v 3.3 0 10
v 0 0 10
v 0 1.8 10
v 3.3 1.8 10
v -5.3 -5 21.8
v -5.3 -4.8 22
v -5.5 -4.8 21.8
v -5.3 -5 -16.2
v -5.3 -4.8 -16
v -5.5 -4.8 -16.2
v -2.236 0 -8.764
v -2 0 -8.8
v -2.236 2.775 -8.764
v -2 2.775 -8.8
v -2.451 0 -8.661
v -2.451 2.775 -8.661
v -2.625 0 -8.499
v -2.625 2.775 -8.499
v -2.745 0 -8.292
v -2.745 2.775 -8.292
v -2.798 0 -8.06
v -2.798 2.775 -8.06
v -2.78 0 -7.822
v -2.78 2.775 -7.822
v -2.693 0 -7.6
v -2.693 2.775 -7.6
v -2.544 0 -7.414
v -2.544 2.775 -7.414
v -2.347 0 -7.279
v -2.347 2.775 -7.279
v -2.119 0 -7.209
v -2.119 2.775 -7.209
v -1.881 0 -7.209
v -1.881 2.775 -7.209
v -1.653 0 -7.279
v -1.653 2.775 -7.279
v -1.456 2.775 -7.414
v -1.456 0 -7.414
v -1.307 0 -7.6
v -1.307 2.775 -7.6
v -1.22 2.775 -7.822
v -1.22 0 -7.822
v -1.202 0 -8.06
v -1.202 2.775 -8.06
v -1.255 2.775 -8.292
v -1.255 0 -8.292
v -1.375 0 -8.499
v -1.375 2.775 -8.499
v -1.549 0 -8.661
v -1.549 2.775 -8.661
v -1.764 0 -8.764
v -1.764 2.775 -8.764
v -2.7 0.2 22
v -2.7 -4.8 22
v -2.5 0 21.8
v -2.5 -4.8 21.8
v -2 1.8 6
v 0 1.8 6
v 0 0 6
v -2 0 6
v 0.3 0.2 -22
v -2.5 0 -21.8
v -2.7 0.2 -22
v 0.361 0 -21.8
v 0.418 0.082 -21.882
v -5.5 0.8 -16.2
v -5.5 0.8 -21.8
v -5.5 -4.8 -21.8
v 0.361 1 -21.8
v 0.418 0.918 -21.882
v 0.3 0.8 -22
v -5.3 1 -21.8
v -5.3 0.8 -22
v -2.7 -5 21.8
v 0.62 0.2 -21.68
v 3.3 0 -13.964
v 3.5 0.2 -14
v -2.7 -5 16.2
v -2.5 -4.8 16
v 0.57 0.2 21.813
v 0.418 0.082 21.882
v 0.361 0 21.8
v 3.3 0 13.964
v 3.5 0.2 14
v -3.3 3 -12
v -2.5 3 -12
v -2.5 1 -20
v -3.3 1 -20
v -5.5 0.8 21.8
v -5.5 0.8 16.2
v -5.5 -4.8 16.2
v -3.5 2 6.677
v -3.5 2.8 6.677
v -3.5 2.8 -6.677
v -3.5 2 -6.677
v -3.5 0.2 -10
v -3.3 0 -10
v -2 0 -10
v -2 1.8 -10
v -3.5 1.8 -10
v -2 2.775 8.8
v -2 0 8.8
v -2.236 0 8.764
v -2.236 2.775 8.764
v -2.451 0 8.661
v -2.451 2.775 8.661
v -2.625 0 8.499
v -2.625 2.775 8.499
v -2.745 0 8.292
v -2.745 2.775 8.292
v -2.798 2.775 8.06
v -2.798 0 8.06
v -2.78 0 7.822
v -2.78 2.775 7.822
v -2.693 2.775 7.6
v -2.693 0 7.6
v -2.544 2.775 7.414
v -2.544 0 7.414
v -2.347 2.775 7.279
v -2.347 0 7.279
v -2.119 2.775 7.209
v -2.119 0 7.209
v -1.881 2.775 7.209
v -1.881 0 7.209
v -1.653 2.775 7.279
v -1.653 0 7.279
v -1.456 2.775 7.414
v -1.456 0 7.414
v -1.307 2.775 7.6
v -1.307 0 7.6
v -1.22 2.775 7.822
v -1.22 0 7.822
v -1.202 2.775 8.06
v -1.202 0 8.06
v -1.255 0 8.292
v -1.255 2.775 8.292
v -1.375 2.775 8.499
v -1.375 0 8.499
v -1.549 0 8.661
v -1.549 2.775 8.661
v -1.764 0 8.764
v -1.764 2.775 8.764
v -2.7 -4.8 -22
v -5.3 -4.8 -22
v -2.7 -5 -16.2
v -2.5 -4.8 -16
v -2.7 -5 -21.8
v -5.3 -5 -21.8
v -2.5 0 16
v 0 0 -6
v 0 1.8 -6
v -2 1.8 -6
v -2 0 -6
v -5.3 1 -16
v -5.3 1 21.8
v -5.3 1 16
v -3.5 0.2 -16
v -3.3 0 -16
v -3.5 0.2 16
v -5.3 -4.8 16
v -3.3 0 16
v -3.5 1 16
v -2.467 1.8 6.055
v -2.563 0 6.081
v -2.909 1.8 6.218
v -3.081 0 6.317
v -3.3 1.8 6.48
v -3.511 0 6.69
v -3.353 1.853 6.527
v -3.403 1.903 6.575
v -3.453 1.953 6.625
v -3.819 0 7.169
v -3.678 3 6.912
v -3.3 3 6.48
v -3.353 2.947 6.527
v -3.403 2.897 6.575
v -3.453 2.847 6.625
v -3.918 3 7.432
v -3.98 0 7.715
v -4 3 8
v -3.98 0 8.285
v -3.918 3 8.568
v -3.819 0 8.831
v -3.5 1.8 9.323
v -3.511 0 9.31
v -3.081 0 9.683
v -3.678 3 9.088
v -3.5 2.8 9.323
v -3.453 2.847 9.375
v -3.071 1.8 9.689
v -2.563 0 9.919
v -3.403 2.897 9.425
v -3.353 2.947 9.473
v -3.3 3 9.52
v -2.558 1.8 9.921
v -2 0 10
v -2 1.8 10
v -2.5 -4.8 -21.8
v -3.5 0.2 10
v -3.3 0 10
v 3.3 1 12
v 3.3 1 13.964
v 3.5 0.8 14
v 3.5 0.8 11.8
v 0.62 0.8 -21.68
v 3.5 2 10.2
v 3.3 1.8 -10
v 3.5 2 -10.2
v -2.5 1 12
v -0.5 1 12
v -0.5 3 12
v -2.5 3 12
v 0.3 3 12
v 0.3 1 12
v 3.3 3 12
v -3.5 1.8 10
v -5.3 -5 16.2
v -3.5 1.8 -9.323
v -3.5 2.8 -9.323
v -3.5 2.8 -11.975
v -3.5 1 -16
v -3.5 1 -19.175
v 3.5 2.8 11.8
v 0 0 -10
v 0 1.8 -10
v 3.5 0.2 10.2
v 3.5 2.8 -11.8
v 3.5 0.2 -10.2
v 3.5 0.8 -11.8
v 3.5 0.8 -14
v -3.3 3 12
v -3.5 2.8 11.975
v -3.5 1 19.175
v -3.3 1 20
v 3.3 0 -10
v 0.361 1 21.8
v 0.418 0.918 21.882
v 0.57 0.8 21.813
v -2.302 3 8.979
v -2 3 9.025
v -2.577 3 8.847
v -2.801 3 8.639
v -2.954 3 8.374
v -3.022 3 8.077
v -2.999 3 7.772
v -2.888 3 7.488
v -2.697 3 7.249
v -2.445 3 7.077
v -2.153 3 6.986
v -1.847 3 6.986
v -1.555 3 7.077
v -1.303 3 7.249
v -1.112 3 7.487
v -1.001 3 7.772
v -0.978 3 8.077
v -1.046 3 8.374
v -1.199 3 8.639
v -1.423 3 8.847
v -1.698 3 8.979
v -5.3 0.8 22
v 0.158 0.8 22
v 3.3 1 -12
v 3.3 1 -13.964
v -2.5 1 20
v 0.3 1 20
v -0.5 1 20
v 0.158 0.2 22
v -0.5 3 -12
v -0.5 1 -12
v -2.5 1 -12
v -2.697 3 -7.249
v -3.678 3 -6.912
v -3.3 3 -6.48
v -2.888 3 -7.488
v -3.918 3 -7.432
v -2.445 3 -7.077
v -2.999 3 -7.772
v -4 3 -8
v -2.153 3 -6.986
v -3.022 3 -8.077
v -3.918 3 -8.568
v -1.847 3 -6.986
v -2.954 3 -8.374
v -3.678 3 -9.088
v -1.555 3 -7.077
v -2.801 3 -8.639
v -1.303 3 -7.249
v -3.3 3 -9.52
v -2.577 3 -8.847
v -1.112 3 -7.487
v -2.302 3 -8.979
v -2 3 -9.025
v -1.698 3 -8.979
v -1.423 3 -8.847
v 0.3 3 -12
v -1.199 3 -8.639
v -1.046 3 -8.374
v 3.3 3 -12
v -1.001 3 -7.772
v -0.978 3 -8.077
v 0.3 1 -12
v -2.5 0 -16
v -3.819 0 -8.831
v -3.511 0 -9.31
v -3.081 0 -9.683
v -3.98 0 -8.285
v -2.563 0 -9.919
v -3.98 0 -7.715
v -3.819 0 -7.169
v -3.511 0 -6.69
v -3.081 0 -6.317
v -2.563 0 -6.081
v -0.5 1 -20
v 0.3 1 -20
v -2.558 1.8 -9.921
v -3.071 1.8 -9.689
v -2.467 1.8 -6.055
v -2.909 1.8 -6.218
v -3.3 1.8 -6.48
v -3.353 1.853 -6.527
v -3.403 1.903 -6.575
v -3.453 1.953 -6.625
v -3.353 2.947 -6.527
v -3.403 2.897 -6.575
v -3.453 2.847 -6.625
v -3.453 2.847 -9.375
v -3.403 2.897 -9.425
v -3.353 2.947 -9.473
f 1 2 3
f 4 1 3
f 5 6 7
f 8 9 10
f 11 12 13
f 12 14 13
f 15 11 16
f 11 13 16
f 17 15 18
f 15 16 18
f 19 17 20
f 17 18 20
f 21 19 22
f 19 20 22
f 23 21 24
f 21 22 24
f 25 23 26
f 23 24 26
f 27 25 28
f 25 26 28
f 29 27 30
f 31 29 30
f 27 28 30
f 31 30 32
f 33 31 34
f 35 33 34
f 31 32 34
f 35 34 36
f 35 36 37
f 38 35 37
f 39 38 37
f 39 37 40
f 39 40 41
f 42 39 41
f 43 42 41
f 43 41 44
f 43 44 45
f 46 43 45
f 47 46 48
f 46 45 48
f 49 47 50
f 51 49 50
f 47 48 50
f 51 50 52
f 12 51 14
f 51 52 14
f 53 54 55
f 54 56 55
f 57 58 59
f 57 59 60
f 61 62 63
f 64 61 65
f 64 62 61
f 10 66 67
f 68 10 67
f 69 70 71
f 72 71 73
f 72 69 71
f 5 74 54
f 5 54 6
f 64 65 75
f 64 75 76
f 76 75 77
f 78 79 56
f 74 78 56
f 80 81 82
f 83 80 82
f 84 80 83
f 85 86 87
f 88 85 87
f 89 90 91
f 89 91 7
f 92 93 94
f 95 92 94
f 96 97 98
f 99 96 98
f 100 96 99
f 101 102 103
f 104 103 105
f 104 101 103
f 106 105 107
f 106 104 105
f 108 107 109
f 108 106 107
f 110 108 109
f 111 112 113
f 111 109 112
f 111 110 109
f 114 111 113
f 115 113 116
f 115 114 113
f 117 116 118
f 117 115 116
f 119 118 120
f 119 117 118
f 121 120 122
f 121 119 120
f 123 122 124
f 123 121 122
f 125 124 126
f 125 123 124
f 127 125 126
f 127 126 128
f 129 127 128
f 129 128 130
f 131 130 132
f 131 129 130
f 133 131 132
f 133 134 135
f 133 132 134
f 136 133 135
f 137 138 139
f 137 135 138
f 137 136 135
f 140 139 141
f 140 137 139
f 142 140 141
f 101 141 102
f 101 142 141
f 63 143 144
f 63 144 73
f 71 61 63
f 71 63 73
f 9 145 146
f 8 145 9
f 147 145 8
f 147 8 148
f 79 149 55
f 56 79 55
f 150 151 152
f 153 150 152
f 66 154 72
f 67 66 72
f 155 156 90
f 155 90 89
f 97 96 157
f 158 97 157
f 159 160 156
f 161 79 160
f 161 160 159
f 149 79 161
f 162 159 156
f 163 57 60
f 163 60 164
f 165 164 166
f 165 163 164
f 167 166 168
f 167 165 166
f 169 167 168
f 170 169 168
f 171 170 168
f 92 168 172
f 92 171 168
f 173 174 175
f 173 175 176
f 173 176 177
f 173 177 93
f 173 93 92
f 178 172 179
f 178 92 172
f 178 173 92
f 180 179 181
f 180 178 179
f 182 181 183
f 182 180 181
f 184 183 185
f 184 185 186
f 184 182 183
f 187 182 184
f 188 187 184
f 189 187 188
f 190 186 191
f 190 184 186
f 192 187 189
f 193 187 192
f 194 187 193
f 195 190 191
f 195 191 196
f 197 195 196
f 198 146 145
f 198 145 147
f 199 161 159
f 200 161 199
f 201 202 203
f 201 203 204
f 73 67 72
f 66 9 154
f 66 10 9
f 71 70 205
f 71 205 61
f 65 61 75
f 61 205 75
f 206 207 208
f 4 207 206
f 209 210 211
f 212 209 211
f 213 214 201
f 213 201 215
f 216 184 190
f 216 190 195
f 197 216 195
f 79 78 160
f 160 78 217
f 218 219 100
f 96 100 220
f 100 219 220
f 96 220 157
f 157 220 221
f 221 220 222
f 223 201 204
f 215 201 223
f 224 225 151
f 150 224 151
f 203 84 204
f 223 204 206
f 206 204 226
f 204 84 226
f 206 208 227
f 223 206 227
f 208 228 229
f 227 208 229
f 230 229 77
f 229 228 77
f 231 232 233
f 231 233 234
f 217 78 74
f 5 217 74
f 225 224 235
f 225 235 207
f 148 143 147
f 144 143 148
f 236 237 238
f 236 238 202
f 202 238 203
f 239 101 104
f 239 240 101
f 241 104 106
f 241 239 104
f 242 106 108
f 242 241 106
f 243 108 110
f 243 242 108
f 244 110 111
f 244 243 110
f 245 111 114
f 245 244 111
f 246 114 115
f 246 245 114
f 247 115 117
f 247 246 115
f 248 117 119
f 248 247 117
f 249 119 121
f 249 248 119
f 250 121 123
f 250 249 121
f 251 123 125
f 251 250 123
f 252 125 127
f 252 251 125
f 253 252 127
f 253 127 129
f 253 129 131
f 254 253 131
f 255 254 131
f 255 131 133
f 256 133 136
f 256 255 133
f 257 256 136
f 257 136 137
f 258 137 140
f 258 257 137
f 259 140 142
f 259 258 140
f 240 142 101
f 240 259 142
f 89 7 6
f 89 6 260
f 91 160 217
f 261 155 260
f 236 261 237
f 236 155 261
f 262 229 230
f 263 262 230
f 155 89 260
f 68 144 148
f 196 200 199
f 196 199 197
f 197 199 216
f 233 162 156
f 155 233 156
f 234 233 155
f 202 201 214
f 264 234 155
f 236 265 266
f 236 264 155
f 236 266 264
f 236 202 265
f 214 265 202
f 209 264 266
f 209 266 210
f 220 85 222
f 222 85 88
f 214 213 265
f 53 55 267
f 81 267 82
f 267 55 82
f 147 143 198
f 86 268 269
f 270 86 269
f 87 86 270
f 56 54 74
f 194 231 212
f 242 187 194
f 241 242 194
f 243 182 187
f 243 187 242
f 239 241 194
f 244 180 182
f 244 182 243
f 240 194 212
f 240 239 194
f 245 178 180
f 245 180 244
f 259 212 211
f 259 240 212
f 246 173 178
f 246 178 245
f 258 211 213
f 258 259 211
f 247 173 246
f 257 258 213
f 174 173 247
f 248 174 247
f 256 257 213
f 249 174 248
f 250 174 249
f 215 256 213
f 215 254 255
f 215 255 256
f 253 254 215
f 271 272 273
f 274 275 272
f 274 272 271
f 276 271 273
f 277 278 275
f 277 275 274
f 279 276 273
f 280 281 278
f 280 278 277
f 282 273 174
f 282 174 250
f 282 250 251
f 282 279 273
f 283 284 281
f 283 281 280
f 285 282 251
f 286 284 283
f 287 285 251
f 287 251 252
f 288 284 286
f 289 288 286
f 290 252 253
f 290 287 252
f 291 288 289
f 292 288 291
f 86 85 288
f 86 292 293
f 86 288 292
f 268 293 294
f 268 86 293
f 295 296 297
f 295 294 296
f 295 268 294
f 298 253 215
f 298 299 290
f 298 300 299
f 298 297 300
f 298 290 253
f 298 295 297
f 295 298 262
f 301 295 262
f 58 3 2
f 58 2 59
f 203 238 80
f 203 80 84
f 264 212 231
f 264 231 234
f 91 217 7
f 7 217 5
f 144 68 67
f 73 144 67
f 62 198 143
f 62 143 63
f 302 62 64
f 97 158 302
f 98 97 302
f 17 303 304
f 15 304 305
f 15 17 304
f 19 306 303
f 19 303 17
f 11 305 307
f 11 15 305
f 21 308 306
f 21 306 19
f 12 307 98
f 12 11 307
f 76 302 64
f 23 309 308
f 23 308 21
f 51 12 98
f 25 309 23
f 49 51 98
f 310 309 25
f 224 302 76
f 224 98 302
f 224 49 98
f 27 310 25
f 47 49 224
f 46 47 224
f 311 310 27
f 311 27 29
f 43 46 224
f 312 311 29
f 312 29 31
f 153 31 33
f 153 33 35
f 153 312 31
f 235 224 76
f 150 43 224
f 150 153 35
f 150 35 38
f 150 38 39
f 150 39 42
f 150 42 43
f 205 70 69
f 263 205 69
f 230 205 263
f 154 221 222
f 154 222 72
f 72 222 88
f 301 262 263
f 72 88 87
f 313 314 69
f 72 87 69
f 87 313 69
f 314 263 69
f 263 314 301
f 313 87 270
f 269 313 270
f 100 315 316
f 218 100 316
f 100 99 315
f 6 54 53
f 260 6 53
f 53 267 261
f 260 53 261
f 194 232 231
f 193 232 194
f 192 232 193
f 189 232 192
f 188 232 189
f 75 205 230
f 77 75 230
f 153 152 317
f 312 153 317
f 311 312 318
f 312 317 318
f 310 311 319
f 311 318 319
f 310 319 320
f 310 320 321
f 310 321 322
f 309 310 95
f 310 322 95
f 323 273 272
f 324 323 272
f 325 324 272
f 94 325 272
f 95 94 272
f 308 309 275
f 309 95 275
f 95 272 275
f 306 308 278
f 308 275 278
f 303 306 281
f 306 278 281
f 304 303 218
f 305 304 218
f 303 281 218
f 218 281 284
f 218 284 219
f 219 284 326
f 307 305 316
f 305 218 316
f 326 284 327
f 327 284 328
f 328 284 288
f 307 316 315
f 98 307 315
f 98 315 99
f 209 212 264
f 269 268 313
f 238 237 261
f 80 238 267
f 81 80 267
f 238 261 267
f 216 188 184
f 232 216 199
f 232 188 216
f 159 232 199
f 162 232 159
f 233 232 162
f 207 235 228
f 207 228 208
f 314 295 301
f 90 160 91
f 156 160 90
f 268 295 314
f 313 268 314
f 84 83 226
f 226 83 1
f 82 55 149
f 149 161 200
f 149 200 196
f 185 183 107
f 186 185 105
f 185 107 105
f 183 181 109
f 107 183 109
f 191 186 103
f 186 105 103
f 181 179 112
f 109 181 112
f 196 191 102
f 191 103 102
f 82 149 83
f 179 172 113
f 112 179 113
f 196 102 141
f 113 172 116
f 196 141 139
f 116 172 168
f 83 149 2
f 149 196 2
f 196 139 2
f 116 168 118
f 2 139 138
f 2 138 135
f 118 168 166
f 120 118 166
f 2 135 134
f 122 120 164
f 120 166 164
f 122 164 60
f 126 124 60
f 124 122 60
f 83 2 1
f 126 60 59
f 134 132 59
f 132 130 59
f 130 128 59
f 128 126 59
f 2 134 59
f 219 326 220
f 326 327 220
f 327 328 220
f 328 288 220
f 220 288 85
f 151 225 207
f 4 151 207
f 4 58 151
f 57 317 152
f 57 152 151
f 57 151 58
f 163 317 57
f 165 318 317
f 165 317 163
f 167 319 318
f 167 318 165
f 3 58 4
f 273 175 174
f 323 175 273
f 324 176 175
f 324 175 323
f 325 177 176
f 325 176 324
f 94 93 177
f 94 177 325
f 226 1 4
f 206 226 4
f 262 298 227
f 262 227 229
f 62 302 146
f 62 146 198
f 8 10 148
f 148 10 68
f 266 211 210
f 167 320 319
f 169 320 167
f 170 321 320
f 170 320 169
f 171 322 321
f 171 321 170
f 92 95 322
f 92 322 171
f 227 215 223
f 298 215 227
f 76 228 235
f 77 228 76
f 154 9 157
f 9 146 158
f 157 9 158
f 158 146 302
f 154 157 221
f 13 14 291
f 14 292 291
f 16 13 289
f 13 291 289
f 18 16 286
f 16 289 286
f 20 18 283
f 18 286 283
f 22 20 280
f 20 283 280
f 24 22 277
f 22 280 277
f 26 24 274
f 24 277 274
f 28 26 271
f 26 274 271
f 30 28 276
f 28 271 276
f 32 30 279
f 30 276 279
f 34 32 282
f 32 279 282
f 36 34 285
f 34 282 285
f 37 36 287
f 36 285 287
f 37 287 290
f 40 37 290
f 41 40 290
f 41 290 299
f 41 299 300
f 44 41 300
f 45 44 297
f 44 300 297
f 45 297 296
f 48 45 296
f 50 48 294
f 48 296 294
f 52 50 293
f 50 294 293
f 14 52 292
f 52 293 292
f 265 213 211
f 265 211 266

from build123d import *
from OCP.BRepFilletAPI import BRepFilletAPI_MakeChamfer

# Parameters (mm, degrees)
SKETCH_1_W          = 7
SKETCH_1_H          = 44
EXTRUDE_1_DEPTH     = 3
CUT_EXTRUDE_1_DEPTH = 23.477766793
CUT_EXTRUDE_2_DEPTH = 24.280893454
RIB_4_REACH         = 25.281
SKETCH_4_WALL_W     = 56.807998158
SKETCH_4_WALL_H     = 1
RIB_5_REACH         = 24.561
SKETCH_5_WALL_W     = 55.368267942
SKETCH_5_WALL_H     = 0.8
SKETCH_10_W         = 20
SKETCH_10_H         = 3.6
CUT_EXTRUDE_3_DEPTH = 24.280893454
EXTRUDE_2_DEPTH     = 3
EXTRUDE_START       = -1
SKETCH_9_W          = 6
SKETCH_9_H          = 6
EXTRUDE_3_DEPTH     = 3
CHAMFER_1_SIZE      = 0.2
CHAMFER_1_SIZE2     = 0.34176015
CHAMFER_2_SIZE      = 0.2
CHAMFER_3_SIZE      = 0.2


with BuildPart() as part:
    # 草图1 → 凸台-拉伸1 (new body)
    with BuildSketch(Plane(origin=(0, 0, 0), x_dir=(1, 0, 0), z_dir=(0, 1, 0))):
        Rectangle(SKETCH_1_W, SKETCH_1_H)
    extrude(amount=EXTRUDE_1_DEPTH)

    # 草图2 → 切除-拉伸1 (cut, through all)
    with BuildSketch(Plane(origin=(0, 3, 0), x_dir=(1, 0, 0), z_dir=(0, 1, 0))):
        Polygon((3.5, 22), (0.5, 22), (3.5, 14), align=None)
        Polygon((3.5, -22), (0.5, -22), (3.5, -14), align=None)
    extrude(amount=-CUT_EXTRUDE_1_DEPTH, mode=Mode.SUBTRACT)

    # 草图3 → 切除-拉伸2 (cut, through all)
    with BuildSketch(Plane(origin=(3.5, 0, 0), x_dir=(0, 0, -1), z_dir=(1, 0, 0))):
        Polygon((-14, 2.6), (-14, 3), (-22, 3), (-22, 1), align=None)
        Polygon((-14, 1), (-14, 2.6), (-22, 1), align=None)
        Polygon((-12, 1), (-12, 3), (-14, 2.6), (-14, 1), align=None)
        Polygon((-14, 2.6), (-12, 3), (-14, 3), align=None)
        Polygon((14, 2.6), (12, 3), (12, 1), (14, 1), align=None)
        Polygon((22, 1), (14, 2.6), (14, 1), align=None)
        Polygon((22, 3), (14, 3), (14, 2.6), (22, 1), align=None)
        Polygon((14, 3), (12, 3), (14, 2.6), align=None)
    extrude(amount=-CUT_EXTRUDE_2_DEPTH, mode=Mode.SUBTRACT)

    # 草图4 wall → 筋4 (add, up to next)
    with BuildSketch(Plane(origin=(-3.5, 2, 16), x_dir=(0, -0.242535625036, 0.970142500145), z_dir=(0, 0.970142500145, 0.242535625036)), mode=Mode.PRIVATE) as rib_4_sk1:
        with Locations((0, 0.5)):
            Rectangle(SKETCH_4_WALL_W, SKETCH_4_WALL_H)
    rib_4_tool1 = extrude(rib_4_sk1.sketch, amount=-RIB_4_REACH, mode=Mode.PRIVATE) - part.part
    rib_4 = rib_4_tool1.solids().sort_by_distance((-3.5, 2, 16))[0]
    add(rib_4)

    # 草图5 wall → 筋5 (add, up to next)
    with BuildSketch(Plane(origin=(-0.5, 2, 16), x_dir=(0, -0.242535625036, 0.970142500145), z_dir=(0, 0.970142500145, 0.242535625036)), mode=Mode.PRIVATE) as rib_5_sk1:
        with Locations((0, 0.4)):
            Rectangle(SKETCH_5_WALL_W, SKETCH_5_WALL_H)
    rib_5_tool1 = extrude(rib_5_sk1.sketch, amount=-RIB_5_REACH, mode=Mode.PRIVATE) - part.part
    rib_5 = rib_5_tool1.solids().sort_by_distance((-0.5, 2, 16))[0]
    add(rib_5)

    # 草图10 → 切除-拉伸3 (cut, through all)
    with BuildSketch(Plane.ZY.offset(3.5)):
        Rectangle(SKETCH_10_W, SKETCH_10_H)
    extrude(amount=-CUT_EXTRUDE_3_DEPTH, mode=Mode.SUBTRACT)

    # 草图6 → 凸台-拉伸2 (add)
    with BuildSketch(Plane(origin=(0, 3, 0), x_dir=(1, 0, 0), z_dir=(0, 1, 0))):
        with BuildLine():
            Line((0, -6), (-2, -6))
            ThreePointArc((-2, -6), (-4, -8), (-2, -10))
            Line((-2, -10), (0, -10))
            Line((0, -10), (0, -6))
        make_face()
    extrude_2 = extrude(amount=-EXTRUDE_2_DEPTH)

    # 草图8 → M2 螺纹孔1 (revolve, cut)
    with BuildSketch(Plane(origin=(-2, 3, 8), x_dir=(0, 0, 1), z_dir=(1, 0, 0))):
        Polygon((0, 0), (0, 6.480688495), (0.8, 6), (0.8, 0.225), (1.025, 0), align=None)
    hole_wizard_m2_1 = revolve(axis=Axis((-2, 9.35, 8), (0, -1, 0)), mode=Mode.SUBTRACT)

    # 草图9 → 凸台-拉伸3 (add)
    with BuildSketch(Plane.ZY.offset(3.5).offset(EXTRUDE_START)):
        with Locations((19, -2)):
            Rectangle(SKETCH_9_W, SKETCH_9_H)
    extrude_3 = extrude(amount=EXTRUDE_3_DEPTH)

    # 镜向1: 筋4, 筋5, 凸台-拉伸2, M2 螺纹孔1, 凸台-拉伸3 across plane
    add(rib_4.mirror(Plane.XY))
    add(rib_5.mirror(Plane.XY))
    add(extrude_2.mirror(Plane.XY))
    add(hole_wizard_m2_1.mirror(Plane.XY), mode=Mode.SUBTRACT)
    add(extrude_3.mirror(Plane.XY))

    # 倒角1: one chamfer whose edges measure the first distance from different faces: ONE call of the kernel's chamfer builder (chamfer() names one face for all edges)
    chamfer_1_edges_1 = [part.edges().sort_by_distance(p)[0] for p in [
        (0.5, 0.5, -22),
    ]]
    chamfer_1_side_1 = [part.faces().sort_by_distance(p)[0] for p in [
        (-3.571428571, -1.642857143, -22),
    ]]
    chamfer_1_edges_2 = [part.edges().sort_by_distance(p)[0] for p in [
        (-1, 0, 22),
        (-2.5, -2.5, 22),
        (-4, -5, 22),
        (-2.5, -5, 19),
        (-4, -5, 16),
        (-5.5, -2, 22),
        (-5.5, 1, 19),
        (-5.5, -2, 16),
        (-5.5, -5, 19),
        (-1, 0, -22),
        (-4, -5, -22),
        (-5.5, -2, -22),
        (-5.5, -2, -16),
        (-5.5, 1, -19),
        (-4, -5, -16),
        (-5.5, -5, -19),
        (-2.5, -2.5, -22),
        (-2.5, -5, -19),
        (-2.5, 1, 22),
        (-2.5, 1, -22),
    ]]
    chamfer_1_edges_3 = [part.edges().sort_by_distance(p)[0] for p in [
        (0.5, 0.5, 22),
    ]]
    chamfer_1_side_3 = [part.faces().sort_by_distance(p)[0] for p in [
        (2, 0.5, 18),
    ]]
    chamfer_1 = BRepFilletAPI_MakeChamfer(part.part.solid().wrapped)
    for e in chamfer_1_edges_1:
        chamfer_1.Add(CHAMFER_1_SIZE, CHAMFER_1_SIZE2, e.wrapped, chamfer_1_side_1[0].wrapped)  # the first distance lies on this face
    for e in chamfer_1_edges_2:
        chamfer_1.Add(CHAMFER_1_SIZE, e.wrapped)
    for e in chamfer_1_edges_3:
        chamfer_1.Add(CHAMFER_1_SIZE, CHAMFER_1_SIZE2, e.wrapped, chamfer_1_side_3[0].wrapped)  # the first distance lies on this face
    add(Compound.cast(chamfer_1.Shape()), mode=Mode.REPLACE)

    # 倒角2
    chamfer_2_edges = [part.edges().sort_by_distance(p)[0] for p in [
        (2.06, 0, -17.84),
        (2.06, 1, -17.84),
        (3.5, 0, -12),
        (3.5, 0.9, -10),
        (3.5, 1.8, 0),
        (3.5, 0.9, 10),
        (3.5, 0, 12),
        (2.0375, 0, 17.9),
        (3.5, 1, -13),
        (3.5, 2, -12),
        (3.5, 3, 0),
        (3.5, 2, 12),
        (3.5, 1, 13),
        (2.0375, 1, 17.9),
    ]]
    chamfer(chamfer_2_edges, length=CHAMFER_2_SIZE)

    # 倒角3
    chamfer_3_edges = [part.edges().sort_by_distance(p)[0] for p in [
        (-3.5, 0, 13),
        (-3.5, 1.8, 0),
        (-3.5, 3, 10.661437828),
        (-3.5, 2, -16),
        (-3.5, 3, 0),
        (-3.5, 0, -13),
        (-3.5, 3, -10.661437828),
        (-3.5, 2, 16),
    ]]
    chamfer(chamfer_3_edges, length=CHAMFER_3_SIZE)


solid = part.part
